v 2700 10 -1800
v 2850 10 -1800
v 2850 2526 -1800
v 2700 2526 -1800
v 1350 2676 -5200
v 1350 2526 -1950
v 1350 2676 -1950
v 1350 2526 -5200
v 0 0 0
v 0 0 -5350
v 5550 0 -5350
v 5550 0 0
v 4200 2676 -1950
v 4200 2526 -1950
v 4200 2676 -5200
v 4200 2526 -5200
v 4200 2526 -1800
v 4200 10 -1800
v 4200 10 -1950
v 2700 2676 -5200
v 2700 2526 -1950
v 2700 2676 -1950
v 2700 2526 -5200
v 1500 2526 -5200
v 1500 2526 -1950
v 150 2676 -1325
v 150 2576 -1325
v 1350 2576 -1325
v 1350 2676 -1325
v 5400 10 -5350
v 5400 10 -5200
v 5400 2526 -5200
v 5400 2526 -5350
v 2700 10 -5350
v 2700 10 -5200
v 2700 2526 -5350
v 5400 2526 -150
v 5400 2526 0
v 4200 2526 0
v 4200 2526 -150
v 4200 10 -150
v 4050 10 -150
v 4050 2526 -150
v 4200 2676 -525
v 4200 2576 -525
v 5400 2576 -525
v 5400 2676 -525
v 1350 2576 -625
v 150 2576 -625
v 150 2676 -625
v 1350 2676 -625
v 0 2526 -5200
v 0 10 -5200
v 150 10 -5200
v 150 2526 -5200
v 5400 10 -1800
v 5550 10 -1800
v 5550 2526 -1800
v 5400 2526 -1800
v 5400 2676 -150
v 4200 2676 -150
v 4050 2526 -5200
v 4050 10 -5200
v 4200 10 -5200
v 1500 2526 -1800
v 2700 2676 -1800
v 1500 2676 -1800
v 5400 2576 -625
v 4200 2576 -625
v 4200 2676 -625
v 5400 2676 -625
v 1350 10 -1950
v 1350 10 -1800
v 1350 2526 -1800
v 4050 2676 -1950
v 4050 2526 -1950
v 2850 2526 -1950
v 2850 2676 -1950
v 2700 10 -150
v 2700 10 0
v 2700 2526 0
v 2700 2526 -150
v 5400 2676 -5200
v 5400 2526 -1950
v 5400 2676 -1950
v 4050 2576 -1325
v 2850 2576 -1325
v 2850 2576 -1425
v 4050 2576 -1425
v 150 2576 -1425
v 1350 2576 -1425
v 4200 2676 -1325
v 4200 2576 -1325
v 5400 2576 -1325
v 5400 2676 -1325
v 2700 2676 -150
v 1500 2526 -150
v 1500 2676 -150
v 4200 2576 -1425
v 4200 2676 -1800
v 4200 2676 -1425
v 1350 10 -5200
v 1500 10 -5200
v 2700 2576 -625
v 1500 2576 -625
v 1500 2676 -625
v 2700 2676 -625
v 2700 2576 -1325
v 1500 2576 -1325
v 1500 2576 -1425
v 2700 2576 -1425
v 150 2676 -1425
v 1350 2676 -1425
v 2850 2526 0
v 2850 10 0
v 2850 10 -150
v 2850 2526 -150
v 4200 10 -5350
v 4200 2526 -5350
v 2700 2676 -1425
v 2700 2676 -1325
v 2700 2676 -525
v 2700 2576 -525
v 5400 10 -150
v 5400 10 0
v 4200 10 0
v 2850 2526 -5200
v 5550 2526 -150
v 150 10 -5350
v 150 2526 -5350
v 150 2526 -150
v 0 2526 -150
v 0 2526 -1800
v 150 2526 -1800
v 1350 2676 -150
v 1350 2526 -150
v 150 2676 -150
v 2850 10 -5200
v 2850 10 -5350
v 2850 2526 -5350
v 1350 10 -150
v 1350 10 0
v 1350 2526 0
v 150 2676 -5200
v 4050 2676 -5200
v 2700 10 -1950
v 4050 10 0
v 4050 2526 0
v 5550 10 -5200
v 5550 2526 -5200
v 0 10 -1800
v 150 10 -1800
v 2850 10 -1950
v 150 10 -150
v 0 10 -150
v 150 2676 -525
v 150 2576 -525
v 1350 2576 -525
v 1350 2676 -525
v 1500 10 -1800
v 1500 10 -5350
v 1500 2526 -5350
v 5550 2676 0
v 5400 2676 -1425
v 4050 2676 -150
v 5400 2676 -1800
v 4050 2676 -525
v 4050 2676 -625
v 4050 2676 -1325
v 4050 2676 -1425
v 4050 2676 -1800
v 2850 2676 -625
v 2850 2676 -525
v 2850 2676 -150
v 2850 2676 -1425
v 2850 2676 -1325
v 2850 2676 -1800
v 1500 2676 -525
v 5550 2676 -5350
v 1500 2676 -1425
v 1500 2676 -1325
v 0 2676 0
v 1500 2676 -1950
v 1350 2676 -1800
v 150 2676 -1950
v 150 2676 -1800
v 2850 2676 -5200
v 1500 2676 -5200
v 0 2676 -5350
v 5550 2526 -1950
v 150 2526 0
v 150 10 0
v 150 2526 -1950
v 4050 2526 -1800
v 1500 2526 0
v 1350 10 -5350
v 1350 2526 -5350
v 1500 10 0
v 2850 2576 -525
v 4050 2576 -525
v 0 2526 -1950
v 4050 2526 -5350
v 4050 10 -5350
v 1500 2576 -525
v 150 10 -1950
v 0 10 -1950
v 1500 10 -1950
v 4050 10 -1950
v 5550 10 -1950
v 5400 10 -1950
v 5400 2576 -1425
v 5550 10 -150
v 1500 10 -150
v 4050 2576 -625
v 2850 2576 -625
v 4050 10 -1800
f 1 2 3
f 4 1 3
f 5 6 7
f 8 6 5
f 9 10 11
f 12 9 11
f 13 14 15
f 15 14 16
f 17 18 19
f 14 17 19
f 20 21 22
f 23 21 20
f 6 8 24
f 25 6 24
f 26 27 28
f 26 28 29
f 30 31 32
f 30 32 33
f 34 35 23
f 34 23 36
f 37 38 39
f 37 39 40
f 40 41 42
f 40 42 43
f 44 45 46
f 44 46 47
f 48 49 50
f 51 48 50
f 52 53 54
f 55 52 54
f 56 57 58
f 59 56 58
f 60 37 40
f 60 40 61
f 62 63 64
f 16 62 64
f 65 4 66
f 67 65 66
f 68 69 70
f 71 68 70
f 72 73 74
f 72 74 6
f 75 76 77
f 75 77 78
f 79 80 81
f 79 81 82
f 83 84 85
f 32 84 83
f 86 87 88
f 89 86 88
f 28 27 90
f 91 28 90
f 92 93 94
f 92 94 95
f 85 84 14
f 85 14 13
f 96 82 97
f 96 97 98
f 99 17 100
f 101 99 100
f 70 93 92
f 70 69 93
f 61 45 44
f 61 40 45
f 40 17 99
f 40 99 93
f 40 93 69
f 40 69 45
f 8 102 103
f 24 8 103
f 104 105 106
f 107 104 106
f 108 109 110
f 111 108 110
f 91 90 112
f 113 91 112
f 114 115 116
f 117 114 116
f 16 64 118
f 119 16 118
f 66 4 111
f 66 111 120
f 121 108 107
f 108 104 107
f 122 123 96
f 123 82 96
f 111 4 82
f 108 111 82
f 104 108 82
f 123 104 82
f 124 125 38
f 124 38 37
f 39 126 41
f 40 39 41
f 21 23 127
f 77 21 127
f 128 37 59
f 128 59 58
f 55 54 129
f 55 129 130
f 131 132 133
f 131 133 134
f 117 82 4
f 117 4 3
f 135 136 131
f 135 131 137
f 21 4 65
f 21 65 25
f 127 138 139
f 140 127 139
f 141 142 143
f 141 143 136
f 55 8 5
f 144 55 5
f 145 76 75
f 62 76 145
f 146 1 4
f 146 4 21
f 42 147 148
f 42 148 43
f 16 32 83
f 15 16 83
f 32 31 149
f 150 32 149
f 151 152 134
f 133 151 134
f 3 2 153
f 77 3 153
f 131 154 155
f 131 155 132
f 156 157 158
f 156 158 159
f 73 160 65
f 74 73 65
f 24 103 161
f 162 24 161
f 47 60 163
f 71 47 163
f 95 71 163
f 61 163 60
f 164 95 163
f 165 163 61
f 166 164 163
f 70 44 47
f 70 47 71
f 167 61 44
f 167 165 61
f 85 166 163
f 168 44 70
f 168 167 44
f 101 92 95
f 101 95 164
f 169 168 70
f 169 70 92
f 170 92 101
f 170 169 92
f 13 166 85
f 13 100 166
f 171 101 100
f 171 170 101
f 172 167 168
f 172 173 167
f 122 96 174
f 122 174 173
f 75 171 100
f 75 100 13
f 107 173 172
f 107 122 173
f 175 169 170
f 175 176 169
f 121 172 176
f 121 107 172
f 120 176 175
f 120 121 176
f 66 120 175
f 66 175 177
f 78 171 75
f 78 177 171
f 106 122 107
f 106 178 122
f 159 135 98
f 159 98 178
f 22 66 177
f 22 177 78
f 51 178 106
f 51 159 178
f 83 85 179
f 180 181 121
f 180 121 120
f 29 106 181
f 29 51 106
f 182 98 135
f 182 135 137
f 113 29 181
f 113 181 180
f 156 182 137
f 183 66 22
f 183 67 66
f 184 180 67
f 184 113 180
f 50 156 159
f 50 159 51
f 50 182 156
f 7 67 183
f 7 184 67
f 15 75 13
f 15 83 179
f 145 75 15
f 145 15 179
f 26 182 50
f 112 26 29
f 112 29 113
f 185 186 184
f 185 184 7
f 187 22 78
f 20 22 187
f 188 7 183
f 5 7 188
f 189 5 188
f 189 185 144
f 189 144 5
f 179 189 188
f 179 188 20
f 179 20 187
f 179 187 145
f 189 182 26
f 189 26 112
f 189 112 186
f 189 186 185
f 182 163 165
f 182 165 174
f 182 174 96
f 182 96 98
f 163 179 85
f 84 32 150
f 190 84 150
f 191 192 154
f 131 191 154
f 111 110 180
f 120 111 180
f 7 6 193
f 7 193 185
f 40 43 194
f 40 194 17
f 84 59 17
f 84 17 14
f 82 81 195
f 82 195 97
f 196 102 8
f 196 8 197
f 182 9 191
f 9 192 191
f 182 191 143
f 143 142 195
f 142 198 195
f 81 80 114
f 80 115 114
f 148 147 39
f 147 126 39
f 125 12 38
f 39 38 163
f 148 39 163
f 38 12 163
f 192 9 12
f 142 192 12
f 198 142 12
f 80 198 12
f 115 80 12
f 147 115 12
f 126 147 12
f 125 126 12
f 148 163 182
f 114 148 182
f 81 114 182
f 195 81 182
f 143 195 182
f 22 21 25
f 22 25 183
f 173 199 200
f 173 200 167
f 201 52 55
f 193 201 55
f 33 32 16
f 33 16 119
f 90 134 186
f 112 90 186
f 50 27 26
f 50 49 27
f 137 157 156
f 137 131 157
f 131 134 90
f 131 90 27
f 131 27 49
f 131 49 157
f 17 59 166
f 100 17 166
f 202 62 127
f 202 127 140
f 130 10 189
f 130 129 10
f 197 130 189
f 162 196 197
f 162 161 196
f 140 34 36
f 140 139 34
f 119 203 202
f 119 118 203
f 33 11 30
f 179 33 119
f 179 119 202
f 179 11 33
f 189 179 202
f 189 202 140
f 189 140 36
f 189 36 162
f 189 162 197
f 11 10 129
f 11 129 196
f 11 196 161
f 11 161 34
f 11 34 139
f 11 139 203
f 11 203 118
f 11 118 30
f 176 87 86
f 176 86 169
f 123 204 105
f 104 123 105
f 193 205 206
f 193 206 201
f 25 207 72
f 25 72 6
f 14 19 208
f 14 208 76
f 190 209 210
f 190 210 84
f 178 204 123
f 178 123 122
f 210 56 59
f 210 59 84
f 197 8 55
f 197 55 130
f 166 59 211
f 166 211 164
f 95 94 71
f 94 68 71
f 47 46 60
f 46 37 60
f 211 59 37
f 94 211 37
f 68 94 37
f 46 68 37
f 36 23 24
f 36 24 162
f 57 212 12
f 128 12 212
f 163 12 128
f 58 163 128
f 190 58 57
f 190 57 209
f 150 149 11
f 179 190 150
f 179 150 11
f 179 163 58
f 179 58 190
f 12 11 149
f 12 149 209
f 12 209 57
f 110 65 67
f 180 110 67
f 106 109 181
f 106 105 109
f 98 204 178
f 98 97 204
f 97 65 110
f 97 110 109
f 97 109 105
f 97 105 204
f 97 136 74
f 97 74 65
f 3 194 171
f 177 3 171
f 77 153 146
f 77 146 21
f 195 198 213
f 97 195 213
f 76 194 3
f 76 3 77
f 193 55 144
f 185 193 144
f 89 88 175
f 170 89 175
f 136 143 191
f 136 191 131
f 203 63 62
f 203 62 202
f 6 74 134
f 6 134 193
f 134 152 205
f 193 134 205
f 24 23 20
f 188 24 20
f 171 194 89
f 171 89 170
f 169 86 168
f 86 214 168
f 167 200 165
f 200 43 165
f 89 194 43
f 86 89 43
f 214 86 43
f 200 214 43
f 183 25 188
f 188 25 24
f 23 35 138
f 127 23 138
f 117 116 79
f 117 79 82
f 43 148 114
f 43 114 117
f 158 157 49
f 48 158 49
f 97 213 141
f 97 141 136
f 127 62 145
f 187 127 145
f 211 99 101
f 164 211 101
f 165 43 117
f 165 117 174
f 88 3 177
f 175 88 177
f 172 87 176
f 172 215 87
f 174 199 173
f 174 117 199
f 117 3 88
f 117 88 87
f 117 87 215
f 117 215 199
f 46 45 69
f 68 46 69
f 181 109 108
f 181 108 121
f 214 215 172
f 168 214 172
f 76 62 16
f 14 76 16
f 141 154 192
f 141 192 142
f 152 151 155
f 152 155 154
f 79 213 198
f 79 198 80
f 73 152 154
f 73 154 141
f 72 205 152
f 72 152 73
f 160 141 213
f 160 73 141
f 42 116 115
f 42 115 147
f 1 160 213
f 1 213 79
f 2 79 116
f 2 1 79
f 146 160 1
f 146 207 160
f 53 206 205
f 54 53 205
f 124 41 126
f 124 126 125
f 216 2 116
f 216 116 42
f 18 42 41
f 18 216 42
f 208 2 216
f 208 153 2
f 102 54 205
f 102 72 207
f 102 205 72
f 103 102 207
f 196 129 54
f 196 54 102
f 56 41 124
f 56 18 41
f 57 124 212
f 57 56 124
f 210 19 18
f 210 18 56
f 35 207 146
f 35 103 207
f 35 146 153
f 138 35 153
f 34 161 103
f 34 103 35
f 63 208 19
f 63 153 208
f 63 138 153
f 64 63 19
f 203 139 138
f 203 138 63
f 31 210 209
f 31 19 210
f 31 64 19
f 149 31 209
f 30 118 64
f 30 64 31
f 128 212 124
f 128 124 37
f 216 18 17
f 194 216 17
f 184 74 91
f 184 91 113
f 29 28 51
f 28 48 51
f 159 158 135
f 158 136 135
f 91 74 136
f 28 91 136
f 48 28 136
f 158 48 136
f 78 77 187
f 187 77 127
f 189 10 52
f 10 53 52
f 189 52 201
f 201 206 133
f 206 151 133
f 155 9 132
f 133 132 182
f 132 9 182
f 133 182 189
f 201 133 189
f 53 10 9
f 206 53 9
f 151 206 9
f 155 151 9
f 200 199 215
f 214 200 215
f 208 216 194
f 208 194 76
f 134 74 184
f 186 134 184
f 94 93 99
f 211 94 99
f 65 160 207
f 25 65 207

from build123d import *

# Parameters (mm, degrees)
SKETCH_1_W                  = 5550
SKETCH_1_H                  = 5350
EXTRUDE_1_DEPTH             = 10
SKETCH_2_W                  = 150
SKETCH_2_H                  = 150
EXTRUDE_2_DEPTH             = 2516
PATTERN_LINEAR_1_COUNT      = 5
PATTERN_LINEAR_1_PITCH      = 1350
PATTERN_LINEAR_1_COUNT_DIR2 = 2
PATTERN_LINEAR_1_PITCH_DIR2 = 1800
SKETCH_3_W                  = 150
SKETCH_3_H                  = 150
EXTRUDE_3_DEPTH             = 2516
PATTERN_LINEAR_2_COUNT      = 5
PATTERN_LINEAR_2_PITCH      = 1350
SKETCH_4_W                  = 150
SKETCH_4_H                  = 150
EXTRUDE_4_DEPTH             = 5550
PATTERN_LINEAR_3_COUNT      = 2
PATTERN_LINEAR_3_PITCH      = 1800
SKETCH_5_W                  = 150
SKETCH_5_H                  = 150
EXTRUDE_5_DEPTH             = 5350
PATTERN_LINEAR_4_COUNT      = 5
PATTERN_LINEAR_4_PITCH      = 1350
PATTERN_LINEAR_5_COUNT      = 2
PATTERN_LINEAR_5_PITCH      = 5200
EXTRUDE_6_REACH             = 8060.752
SKETCH_6_W                  = 100
SKETCH_6_H                  = 100
PATTERN_LINEAR_6_COUNT      = 2
PATTERN_LINEAR_6_PITCH      = 800


with BuildPart() as part:
    # 草图1 → 凸台-拉伸1 (new body)
    with BuildSketch(Plane(origin=(0, 0, 0), x_dir=(1, 0, 0), z_dir=(0, 1, 0))):
        with Locations((2775, 2675)):
            Rectangle(SKETCH_1_W, SKETCH_1_H)
    extrude(amount=EXTRUDE_1_DEPTH)

    # 草图2 → 凸台-拉伸2 (add)
    with BuildSketch(Plane(origin=(0, 10, 0), x_dir=(1, 0, 0), z_dir=(0, 1, 0))):
        with Locations((75, 75)):
            Rectangle(SKETCH_2_W, SKETCH_2_H)
    extrude_2 = extrude(amount=EXTRUDE_2_DEPTH)

    # 阵列(线性)1: Extrude 2 5 × 2
    with Locations(*[(i * PATTERN_LINEAR_1_PITCH, 0, -j * PATTERN_LINEAR_1_PITCH_DIR2) for i in range(PATTERN_LINEAR_1_COUNT) for j in range(PATTERN_LINEAR_1_COUNT_DIR2) if (i, j) != (0, 0)]):
        add(extrude_2)

    # 草图3 → 凸台-拉伸3 (add)
    with BuildSketch(Plane(origin=(0, 10, 0), x_dir=(1, 0, 0), z_dir=(0, 1, 0))):
        with Locations((75, 5275)):
            Rectangle(SKETCH_3_W, SKETCH_3_H)
    extrude_3 = extrude(amount=EXTRUDE_3_DEPTH)

    # 阵列(线性)2: 凸台-拉伸3 ×5
    with Locations(*[(i * PATTERN_LINEAR_2_PITCH, 0, 0) for i in range(1, PATTERN_LINEAR_2_COUNT)]):
        add(extrude_3)

    # 草图4 → 凸台-拉伸4 (add)
    with BuildSketch(Plane(origin=(5550, 0, 0), x_dir=(0, 0, -1), z_dir=(1, 0, 0))):
        with Locations((75, 2601)):
            Rectangle(SKETCH_4_W, SKETCH_4_H)
    extrude_4 = extrude(amount=-EXTRUDE_4_DEPTH)

    # 阵列(线性)3: 凸台-拉伸4 ×2
    with Locations(*[(0, 0, -i * PATTERN_LINEAR_3_PITCH) for i in range(1, PATTERN_LINEAR_3_COUNT)]):
        add(extrude_4)

    # 草图5 → 凸台-拉伸5 (add)
    with BuildSketch(Plane.XY):
        with Locations((75, 2601)):
            Rectangle(SKETCH_5_W, SKETCH_5_H)
    extrude_5 = extrude(amount=-EXTRUDE_5_DEPTH)

    # 阵列(线性)4: 凸台-拉伸5 ×5
    with Locations(*[(i * PATTERN_LINEAR_4_PITCH, 0, 0) for i in range(1, PATTERN_LINEAR_4_COUNT)]):
        add(extrude_5)

    # 阵列(线性)5: 凸台-拉伸4 ×2
    with Locations(*[(0, 0, -i * PATTERN_LINEAR_5_PITCH) for i in range(1, PATTERN_LINEAR_5_COUNT)]):
        add(extrude_4)

    # 凸台-拉伸6: up to this face of the body (flat: up to its plane)
    extrude_6_end = Plane(part.part.faces().sort_by_distance((5400, 2601, -975))[0])
    # 草图6 → 凸台-拉伸6 (add, up to the picked face)
    with BuildSketch(Plane(origin=(150, 0, 0), x_dir=(0, 0, -1), z_dir=(1, 0, 0)), mode=Mode.PRIVATE) as extrude_6_sk1:
        with Locations((575, 2626)):
            Rectangle(SKETCH_6_W, SKETCH_6_H)
    extrude_6_tool1 = split(extrude(extrude_6_sk1.sketch, amount=EXTRUDE_6_REACH, mode=Mode.PRIVATE), bisect_by=extrude_6_end, keep=Keep.BOTH, mode=Mode.PRIVATE)
    extrude_6 = extrude_6_tool1.solids().sort_by(Axis((150, 2626, -575), (1, 0, 0)))[0]
    add(extrude_6)

    # 阵列(线性)6: 凸台-拉伸6 ×2
    with Locations(*[(0, 0, -i * PATTERN_LINEAR_6_PITCH) for i in range(1, PATTERN_LINEAR_6_COUNT)]):
        add(extrude_6)


solid = part.part
